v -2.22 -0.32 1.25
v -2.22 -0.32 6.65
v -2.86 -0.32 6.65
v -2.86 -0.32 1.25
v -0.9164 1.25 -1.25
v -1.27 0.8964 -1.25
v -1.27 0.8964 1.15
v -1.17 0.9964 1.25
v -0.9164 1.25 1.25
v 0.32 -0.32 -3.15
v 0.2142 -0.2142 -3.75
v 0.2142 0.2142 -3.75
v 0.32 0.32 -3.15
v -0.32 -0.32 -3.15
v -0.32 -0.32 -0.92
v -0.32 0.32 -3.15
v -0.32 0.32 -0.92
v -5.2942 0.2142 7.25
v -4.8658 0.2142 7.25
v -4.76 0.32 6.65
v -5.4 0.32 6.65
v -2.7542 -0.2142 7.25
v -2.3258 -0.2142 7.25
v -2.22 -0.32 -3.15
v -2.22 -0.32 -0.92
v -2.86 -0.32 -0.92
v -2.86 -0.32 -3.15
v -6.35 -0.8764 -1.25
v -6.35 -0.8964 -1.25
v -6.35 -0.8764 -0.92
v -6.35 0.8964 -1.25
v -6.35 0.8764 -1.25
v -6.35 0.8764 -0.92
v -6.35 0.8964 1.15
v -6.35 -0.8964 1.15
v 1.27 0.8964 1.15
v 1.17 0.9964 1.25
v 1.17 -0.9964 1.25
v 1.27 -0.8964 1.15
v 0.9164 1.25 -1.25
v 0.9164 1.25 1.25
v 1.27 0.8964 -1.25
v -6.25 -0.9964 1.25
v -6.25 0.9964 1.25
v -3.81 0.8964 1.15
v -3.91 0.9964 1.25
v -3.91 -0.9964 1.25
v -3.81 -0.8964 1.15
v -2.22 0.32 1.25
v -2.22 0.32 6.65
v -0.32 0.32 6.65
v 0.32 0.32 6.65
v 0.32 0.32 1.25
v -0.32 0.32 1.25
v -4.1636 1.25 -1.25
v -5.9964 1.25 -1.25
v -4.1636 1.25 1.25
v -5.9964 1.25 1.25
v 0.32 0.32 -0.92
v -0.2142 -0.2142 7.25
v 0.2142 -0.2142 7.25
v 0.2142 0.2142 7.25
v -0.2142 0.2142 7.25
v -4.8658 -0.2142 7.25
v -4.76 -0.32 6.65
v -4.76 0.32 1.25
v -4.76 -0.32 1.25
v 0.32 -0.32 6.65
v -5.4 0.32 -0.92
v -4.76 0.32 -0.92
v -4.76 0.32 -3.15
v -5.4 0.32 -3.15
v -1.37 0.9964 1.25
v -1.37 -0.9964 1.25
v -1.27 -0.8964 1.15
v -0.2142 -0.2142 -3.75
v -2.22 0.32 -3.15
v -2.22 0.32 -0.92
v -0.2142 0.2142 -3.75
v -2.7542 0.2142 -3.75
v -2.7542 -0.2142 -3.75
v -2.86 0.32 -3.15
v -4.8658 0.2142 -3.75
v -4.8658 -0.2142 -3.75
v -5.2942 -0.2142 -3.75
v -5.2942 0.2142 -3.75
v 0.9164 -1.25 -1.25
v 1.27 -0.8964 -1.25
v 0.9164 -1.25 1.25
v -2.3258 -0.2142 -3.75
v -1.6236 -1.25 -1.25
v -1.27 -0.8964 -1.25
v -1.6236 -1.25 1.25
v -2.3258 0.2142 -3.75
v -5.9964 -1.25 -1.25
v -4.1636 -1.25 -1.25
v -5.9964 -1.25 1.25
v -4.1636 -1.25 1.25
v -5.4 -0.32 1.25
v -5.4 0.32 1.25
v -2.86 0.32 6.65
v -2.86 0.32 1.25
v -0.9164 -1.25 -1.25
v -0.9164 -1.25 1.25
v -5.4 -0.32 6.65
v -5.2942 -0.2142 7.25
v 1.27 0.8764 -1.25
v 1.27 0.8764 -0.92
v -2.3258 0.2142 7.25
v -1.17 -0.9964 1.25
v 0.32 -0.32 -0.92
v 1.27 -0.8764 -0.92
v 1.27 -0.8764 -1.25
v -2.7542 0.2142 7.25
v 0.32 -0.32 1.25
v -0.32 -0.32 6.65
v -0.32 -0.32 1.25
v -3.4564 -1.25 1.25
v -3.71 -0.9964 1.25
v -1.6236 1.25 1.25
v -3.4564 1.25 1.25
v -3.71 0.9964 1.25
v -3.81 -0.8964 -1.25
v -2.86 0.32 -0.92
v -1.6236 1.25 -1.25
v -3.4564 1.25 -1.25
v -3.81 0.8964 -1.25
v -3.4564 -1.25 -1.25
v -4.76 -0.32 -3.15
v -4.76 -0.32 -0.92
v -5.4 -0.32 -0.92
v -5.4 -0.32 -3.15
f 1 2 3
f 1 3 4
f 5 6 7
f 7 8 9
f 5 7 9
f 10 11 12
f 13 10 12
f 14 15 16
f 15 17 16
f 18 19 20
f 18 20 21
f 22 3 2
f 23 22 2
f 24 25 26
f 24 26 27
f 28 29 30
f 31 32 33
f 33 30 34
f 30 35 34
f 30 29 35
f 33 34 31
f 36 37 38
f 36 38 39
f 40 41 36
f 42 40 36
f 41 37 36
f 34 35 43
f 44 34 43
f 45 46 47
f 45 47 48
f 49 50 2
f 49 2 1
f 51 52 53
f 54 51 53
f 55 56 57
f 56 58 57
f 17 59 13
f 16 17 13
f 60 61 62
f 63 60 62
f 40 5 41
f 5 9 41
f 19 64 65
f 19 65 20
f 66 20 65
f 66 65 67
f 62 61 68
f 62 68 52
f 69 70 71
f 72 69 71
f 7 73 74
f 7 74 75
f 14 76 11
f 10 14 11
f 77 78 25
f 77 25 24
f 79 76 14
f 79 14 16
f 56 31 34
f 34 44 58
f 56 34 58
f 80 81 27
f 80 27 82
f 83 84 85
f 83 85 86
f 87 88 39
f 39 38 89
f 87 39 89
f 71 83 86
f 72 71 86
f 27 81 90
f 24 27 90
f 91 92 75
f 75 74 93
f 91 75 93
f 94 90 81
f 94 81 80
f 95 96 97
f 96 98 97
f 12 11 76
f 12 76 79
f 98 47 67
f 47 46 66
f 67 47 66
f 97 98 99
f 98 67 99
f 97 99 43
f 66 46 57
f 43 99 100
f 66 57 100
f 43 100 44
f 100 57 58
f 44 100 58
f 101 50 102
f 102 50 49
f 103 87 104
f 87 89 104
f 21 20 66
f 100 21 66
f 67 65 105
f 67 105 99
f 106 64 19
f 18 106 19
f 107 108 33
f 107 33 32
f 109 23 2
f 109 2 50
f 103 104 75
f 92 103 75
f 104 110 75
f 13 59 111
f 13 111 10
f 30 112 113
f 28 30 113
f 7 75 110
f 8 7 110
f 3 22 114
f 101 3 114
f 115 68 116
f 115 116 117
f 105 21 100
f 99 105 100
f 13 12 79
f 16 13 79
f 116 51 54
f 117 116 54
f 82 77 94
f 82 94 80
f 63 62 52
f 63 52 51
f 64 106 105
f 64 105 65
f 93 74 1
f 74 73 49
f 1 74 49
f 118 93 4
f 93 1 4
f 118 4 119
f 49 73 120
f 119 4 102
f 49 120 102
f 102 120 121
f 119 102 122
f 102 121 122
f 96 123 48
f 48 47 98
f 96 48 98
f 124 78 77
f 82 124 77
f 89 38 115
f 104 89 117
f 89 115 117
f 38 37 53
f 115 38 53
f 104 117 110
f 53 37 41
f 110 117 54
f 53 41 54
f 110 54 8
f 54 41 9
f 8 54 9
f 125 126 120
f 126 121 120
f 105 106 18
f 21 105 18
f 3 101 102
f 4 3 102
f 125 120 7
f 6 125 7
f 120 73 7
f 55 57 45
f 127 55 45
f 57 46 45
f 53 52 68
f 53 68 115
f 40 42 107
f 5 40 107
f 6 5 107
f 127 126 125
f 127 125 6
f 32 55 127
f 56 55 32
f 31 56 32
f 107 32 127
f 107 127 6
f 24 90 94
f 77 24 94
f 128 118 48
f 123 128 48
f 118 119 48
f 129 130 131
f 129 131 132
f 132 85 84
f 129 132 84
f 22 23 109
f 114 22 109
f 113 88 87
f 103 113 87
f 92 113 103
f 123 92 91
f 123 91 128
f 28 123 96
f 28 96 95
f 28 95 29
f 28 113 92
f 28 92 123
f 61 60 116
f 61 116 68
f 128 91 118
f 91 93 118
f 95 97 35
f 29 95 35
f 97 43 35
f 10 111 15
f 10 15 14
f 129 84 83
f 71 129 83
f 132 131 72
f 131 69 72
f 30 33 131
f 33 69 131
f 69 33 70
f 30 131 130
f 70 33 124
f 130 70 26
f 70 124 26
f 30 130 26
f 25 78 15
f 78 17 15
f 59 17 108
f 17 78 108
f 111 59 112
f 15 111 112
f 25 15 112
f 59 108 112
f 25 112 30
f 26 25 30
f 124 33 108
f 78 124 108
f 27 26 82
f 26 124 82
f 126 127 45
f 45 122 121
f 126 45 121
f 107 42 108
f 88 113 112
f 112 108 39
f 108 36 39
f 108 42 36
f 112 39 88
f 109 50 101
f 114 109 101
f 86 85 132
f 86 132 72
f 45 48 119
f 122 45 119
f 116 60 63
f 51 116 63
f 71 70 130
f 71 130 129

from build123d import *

# Parameters (mm, degrees)
EXTRUDE1_DEPTH          = 1.25
CUT_EXTRUDE3_DEPTH      = 2.25
LPATTERN4_COUNT         = 3
LPATTERN4_PITCH         = 2.54
SKETCH2_W               = 1.752893218
SKETCH2_H               = 0.33
CUT_EXTRUDE1_DEPTH      = 2.27
CUT_EXTRUDE1_DEPTH_BACK = 7.35
SKETCH3_W               = 11
SKETCH3_H               = 0.64
EXTRUDE_THIN1_DEPTH     = 0.32
LPATTERN5_COUNT         = 3
LPATTERN5_PITCH         = 2.54
CHAMFER2_SIZE           = 0.6
CHAMFER2_SIZE2          = 0.105796188
CHAMFER2_PART_2_SIZE    = 0.6
CHAMFER2_PART_2_SIZE2   = 0.105796188
CHAMFER2_PART_3_SIZE    = 0.6
CHAMFER2_PART_3_SIZE2   = 0.105796188
CHAMFER2_PART_4_SIZE    = 0.6
CHAMFER2_PART_4_SIZE2   = 0.105796188
CHAMFER2_PART_5_SIZE    = 0.6
CHAMFER2_PART_5_SIZE2   = 0.105796188
CHAMFER2_PART_6_SIZE    = 0.6
CHAMFER2_PART_6_SIZE2   = 0.105796188
CHAMFER2_PART_7_SIZE    = 0.6
CHAMFER2_PART_7_SIZE2   = 0.105796188
CHAMFER2_PART_8_SIZE    = 0.6
CHAMFER2_PART_8_SIZE2   = 0.105796188
CHAMFER2_PART_9_SIZE    = 0.6
CHAMFER2_PART_9_SIZE2   = 0.105796188
CHAMFER2_PART_10_SIZE   = 0.6
CHAMFER2_PART_10_SIZE2  = 0.105796188
CHAMFER2_PART_11_SIZE   = 0.6
CHAMFER2_PART_11_SIZE2  = 0.105796188
CHAMFER2_PART_12_SIZE   = 0.6
CHAMFER2_PART_12_SIZE2  = 0.105796188
CHAMFER2_PART_13_SIZE   = 0.6
CHAMFER2_PART_13_SIZE2  = 0.105796188
CHAMFER2_PART_14_SIZE   = 0.6
CHAMFER2_PART_14_SIZE2  = 0.105796188
CHAMFER2_PART_15_SIZE   = 0.6
CHAMFER2_PART_15_SIZE2  = 0.105796188
CHAMFER2_PART_16_SIZE   = 0.6
CHAMFER2_PART_16_SIZE2  = 0.105796188
CHAMFER2_PART_17_SIZE   = 0.6
CHAMFER2_PART_17_SIZE2  = 0.105796188
CHAMFER2_PART_18_SIZE   = 0.6
CHAMFER2_PART_18_SIZE2  = 0.105796188
CHAMFER2_PART_19_SIZE   = 0.6
CHAMFER2_PART_19_SIZE2  = 0.105796188
CHAMFER2_PART_20_SIZE   = 0.6
CHAMFER2_PART_20_SIZE2  = 0.105796188
CHAMFER2_PART_21_SIZE   = 0.6
CHAMFER2_PART_21_SIZE2  = 0.105796188
CHAMFER2_PART_22_SIZE   = 0.6
CHAMFER2_PART_22_SIZE2  = 0.105796188
CHAMFER2_PART_23_SIZE   = 0.6
CHAMFER2_PART_23_SIZE2  = 0.105796188
CHAMFER2_PART_24_SIZE   = 0.6
CHAMFER2_PART_24_SIZE2  = 0.105796188


with BuildPart() as part:
    # Sketch1 → Extrude1 (new body, symmetric)
    with BuildSketch(Plane.XY):
        Polygon((-1.27, 0.896446609), (-0.916446609, 1.25), (0.916446609, 1.25), (1.27, 0.896446609), (1.27, -0.896446609), (0.916446609, -1.25), (-0.916446609, -1.25), (-1.27, -0.896446609), align=None)
    extrude1 = extrude(amount=EXTRUDE1_DEPTH, both=True)

    # Sketch4 → Cut-Extrude3 (cut, symmetric)
    with BuildSketch(Plane(origin=(0, 0, 0), x_dir=(1, 0, 0), z_dir=(0, 1, 0))):
        Polygon((-1.27, -1.15), (-1.17, -1.25), (-1.27, -1.25), align=None)
        Polygon((1.17, -1.25), (1.27, -1.15), (1.27, -1.25), align=None)
    cut_extrude3 = extrude(amount=CUT_EXTRUDE3_DEPTH, both=True, mode=Mode.SUBTRACT)

    # LPattern4: Extrude1, Cut-Extrude3 ×3
    with Locations(*[(-i * LPATTERN4_PITCH, 0, 0) for i in range(1, LPATTERN4_COUNT)]):
        add(extrude1)
        add(cut_extrude3, mode=Mode.SUBTRACT)

    # Sketch2 → Cut-Extrude1 (cut, two sides)
    with BuildSketch(Plane(origin=(0, 0, 0), x_dir=(0, -1, 0), z_dir=(1, 0, 0))) as cut_extrude1_sk:
        with Locations((0, 1.085)):
            Rectangle(SKETCH2_W, SKETCH2_H)
    extrude(amount=CUT_EXTRUDE1_DEPTH, mode=Mode.SUBTRACT)
    extrude(cut_extrude1_sk.sketch, amount=-CUT_EXTRUDE1_DEPTH_BACK, mode=Mode.SUBTRACT)

    # Sketch3 → Extrude-Thin1 (add, symmetric)
    with BuildSketch(Plane(origin=(0, 0, 0), x_dir=(0, 0, -1), z_dir=(1, 0, 0))):
        with Locations((-1.75, 0)):
            Rectangle(SKETCH3_W, SKETCH3_H)
    extrude_thin1 = extrude(amount=EXTRUDE_THIN1_DEPTH, both=True)

    # LPattern5: Extrude-Thin1 ×3
    with Locations(*[(-i * LPATTERN5_PITCH, 0, 0) for i in range(1, LPATTERN5_COUNT)]):
        add(extrude_thin1)

    # Chamfer2
    chamfer2_edges = [part.edges().sort_by_distance(p)[0] for p in [
        (0, -0.32, 7.25),
    ]]
    chamfer2_side = [part.faces().sort_by_distance(p)[0] for p in [
        (0, -0.32, 4.25),
    ]]
    chamfer(chamfer2_edges, length=CHAMFER2_SIZE, length2=CHAMFER2_SIZE2, reference=chamfer2_side[0])

    # Chamfer2 part 2
    chamfer2_part_2_edges = [part.edges().sort_by_distance(p)[0] for p in [
        (0, 0.32, -3.75),
    ]]
    chamfer2_part_2_side = [part.faces().sort_by_distance(p)[0] for p in [
        (0, 0.32, -2.335),
    ]]
    chamfer(chamfer2_part_2_edges, length=CHAMFER2_PART_2_SIZE, length2=CHAMFER2_PART_2_SIZE2, reference=chamfer2_part_2_side[0])

    # Chamfer2 part 3
    chamfer2_part_3_edges = [part.edges().sort_by_distance(p)[0] for p in [
        (-0.32, 0, 7.25),
    ]]
    chamfer2_part_3_side = [part.faces().sort_by_distance(p)[0] for p in [
        (-0.32, 0, 4.25),
    ]]
    chamfer(chamfer2_part_3_edges, length=CHAMFER2_PART_3_SIZE, length2=CHAMFER2_PART_3_SIZE2, reference=chamfer2_part_3_side[0])

    # Chamfer2 part 4
    chamfer2_part_4_edges = [part.edges().sort_by_distance(p)[0] for p in [
        (-0.32, 0, -3.75),
    ]]
    chamfer2_part_4_side = [part.faces().sort_by_distance(p)[0] for p in [
        (-0.32, 0, -2.335),
    ]]
    chamfer(chamfer2_part_4_edges, length=CHAMFER2_PART_4_SIZE, length2=CHAMFER2_PART_4_SIZE2, reference=chamfer2_part_4_side[0])

    # Chamfer2 part 5
    chamfer2_part_5_edges = [part.edges().sort_by_distance(p)[0] for p in [
        (0, -0.32, -3.75),
    ]]
    chamfer2_part_5_side = [part.faces().sort_by_distance(p)[0] for p in [
        (0, -0.32, -2.335),
    ]]
    chamfer(chamfer2_part_5_edges, length=CHAMFER2_PART_5_SIZE, length2=CHAMFER2_PART_5_SIZE2, reference=chamfer2_part_5_side[0])

    # Chamfer2 part 6
    chamfer2_part_6_edges = [part.edges().sort_by_distance(p)[0] for p in [
        (0.32, 0, -3.75),
    ]]
    chamfer2_part_6_side = [part.faces().sort_by_distance(p)[0] for p in [
        (0.32, 0, -2.335),
    ]]
    chamfer(chamfer2_part_6_edges, length=CHAMFER2_PART_6_SIZE, length2=CHAMFER2_PART_6_SIZE2, reference=chamfer2_part_6_side[0])

    # Chamfer2 part 7
    chamfer2_part_7_edges = [part.edges().sort_by_distance(p)[0] for p in [
        (0, 0.32, 7.25),
    ]]
    chamfer2_part_7_side = [part.faces().sort_by_distance(p)[0] for p in [
        (0, 0.32, 4.25),
    ]]
    chamfer(chamfer2_part_7_edges, length=CHAMFER2_PART_7_SIZE, length2=CHAMFER2_PART_7_SIZE2, reference=chamfer2_part_7_side[0])

    # Chamfer2 part 8
    chamfer2_part_8_edges = [part.edges().sort_by_distance(p)[0] for p in [
        (0.32, 0, 7.25),
    ]]
    chamfer2_part_8_side = [part.faces().sort_by_distance(p)[0] for p in [
        (0.32, 0, 4.25),
    ]]
    chamfer(chamfer2_part_8_edges, length=CHAMFER2_PART_8_SIZE, length2=CHAMFER2_PART_8_SIZE2, reference=chamfer2_part_8_side[0])

    # Chamfer2 part 9
    chamfer2_part_9_edges = [part.edges().sort_by_distance(p)[0] for p in [
        (-2.54, -0.32, 7.25),
    ]]
    chamfer2_part_9_side = [part.faces().sort_by_distance(p)[0] for p in [
        (-2.54, -0.32, 4.25),
    ]]
    chamfer(chamfer2_part_9_edges, length=CHAMFER2_PART_9_SIZE, length2=CHAMFER2_PART_9_SIZE2, reference=chamfer2_part_9_side[0])

    # Chamfer2 part 10
    chamfer2_part_10_edges = [part.edges().sort_by_distance(p)[0] for p in [
        (-2.54, 0.32, -3.75),
    ]]
    chamfer2_part_10_side = [part.faces().sort_by_distance(p)[0] for p in [
        (-2.54, 0.32, -2.335),
    ]]
    chamfer(chamfer2_part_10_edges, length=CHAMFER2_PART_10_SIZE, length2=CHAMFER2_PART_10_SIZE2, reference=chamfer2_part_10_side[0])

    # Chamfer2 part 11
    chamfer2_part_11_edges = [part.edges().sort_by_distance(p)[0] for p in [
        (-2.86, 0, -3.75),
    ]]
    chamfer2_part_11_side = [part.faces().sort_by_distance(p)[0] for p in [
        (-2.86, 0, -2.335),
    ]]
    chamfer(chamfer2_part_11_edges, length=CHAMFER2_PART_11_SIZE, length2=CHAMFER2_PART_11_SIZE2, reference=chamfer2_part_11_side[0])

    # Chamfer2 part 12
    chamfer2_part_12_edges = [part.edges().sort_by_distance(p)[0] for p in [
        (-2.86, 0, 7.25),
    ]]
    chamfer2_part_12_side = [part.faces().sort_by_distance(p)[0] for p in [
        (-2.86, 0, 4.25),
    ]]
    chamfer(chamfer2_part_12_edges, length=CHAMFER2_PART_12_SIZE, length2=CHAMFER2_PART_12_SIZE2, reference=chamfer2_part_12_side[0])

    # Chamfer2 part 13
    chamfer2_part_13_edges = [part.edges().sort_by_distance(p)[0] for p in [
        (-2.54, -0.32, -3.75),
    ]]
    chamfer2_part_13_side = [part.faces().sort_by_distance(p)[0] for p in [
        (-2.54, -0.32, -2.335),
    ]]
    chamfer(chamfer2_part_13_edges, length=CHAMFER2_PART_13_SIZE, length2=CHAMFER2_PART_13_SIZE2, reference=chamfer2_part_13_side[0])

    # Chamfer2 part 14
    chamfer2_part_14_edges = [part.edges().sort_by_distance(p)[0] for p in [
        (-2.22, 0, -3.75),
    ]]
    chamfer2_part_14_side = [part.faces().sort_by_distance(p)[0] for p in [
        (-2.22, 0, -2.335),
    ]]
    chamfer(chamfer2_part_14_edges, length=CHAMFER2_PART_14_SIZE, length2=CHAMFER2_PART_14_SIZE2, reference=chamfer2_part_14_side[0])

    # Chamfer2 part 15
    chamfer2_part_15_edges = [part.edges().sort_by_distance(p)[0] for p in [
        (-2.54, 0.32, 7.25),
    ]]
    chamfer2_part_15_side = [part.faces().sort_by_distance(p)[0] for p in [
        (-2.54, 0.32, 4.25),
    ]]
    chamfer(chamfer2_part_15_edges, length=CHAMFER2_PART_15_SIZE, length2=CHAMFER2_PART_15_SIZE2, reference=chamfer2_part_15_side[0])

    # Chamfer2 part 16
    chamfer2_part_16_edges = [part.edges().sort_by_distance(p)[0] for p in [
        (-2.22, 0, 7.25),
    ]]
    chamfer2_part_16_side = [part.faces().sort_by_distance(p)[0] for p in [
        (-2.22, 0, 4.25),
    ]]
    chamfer(chamfer2_part_16_edges, length=CHAMFER2_PART_16_SIZE, length2=CHAMFER2_PART_16_SIZE2, reference=chamfer2_part_16_side[0])

    # Chamfer2 part 17
    chamfer2_part_17_edges = [part.edges().sort_by_distance(p)[0] for p in [
        (-5.08, -0.32, 7.25),
    ]]
    chamfer2_part_17_side = [part.faces().sort_by_distance(p)[0] for p in [
        (-5.08, -0.32, 4.25),
    ]]
    chamfer(chamfer2_part_17_edges, length=CHAMFER2_PART_17_SIZE, length2=CHAMFER2_PART_17_SIZE2, reference=chamfer2_part_17_side[0])

    # Chamfer2 part 18
    chamfer2_part_18_edges = [part.edges().sort_by_distance(p)[0] for p in [
        (-5.08, 0.32, -3.75),
    ]]
    chamfer2_part_18_side = [part.faces().sort_by_distance(p)[0] for p in [
        (-5.08, 0.32, -2.335),
    ]]
    chamfer(chamfer2_part_18_edges, length=CHAMFER2_PART_18_SIZE, length2=CHAMFER2_PART_18_SIZE2, reference=chamfer2_part_18_side[0])

    # Chamfer2 part 19
    chamfer2_part_19_edges = [part.edges().sort_by_distance(p)[0] for p in [
        (-5.4, 0, -3.75),
    ]]
    chamfer2_part_19_side = [part.faces().sort_by_distance(p)[0] for p in [
        (-5.4, 0, -2.335),
    ]]
    chamfer(chamfer2_part_19_edges, length=CHAMFER2_PART_19_SIZE, length2=CHAMFER2_PART_19_SIZE2, reference=chamfer2_part_19_side[0])

    # Chamfer2 part 20
    chamfer2_part_20_edges = [part.edges().sort_by_distance(p)[0] for p in [
        (-5.4, 0, 7.25),
    ]]
    chamfer2_part_20_side = [part.faces().sort_by_distance(p)[0] for p in [
        (-5.4, 0, 4.25),
    ]]
    chamfer(chamfer2_part_20_edges, length=CHAMFER2_PART_20_SIZE, length2=CHAMFER2_PART_20_SIZE2, reference=chamfer2_part_20_side[0])

    # Chamfer2 part 21
    chamfer2_part_21_edges = [part.edges().sort_by_distance(p)[0] for p in [
        (-5.08, -0.32, -3.75),
    ]]
    chamfer2_part_21_side = [part.faces().sort_by_distance(p)[0] for p in [
        (-5.08, -0.32, -2.335),
    ]]
    chamfer(chamfer2_part_21_edges, length=CHAMFER2_PART_21_SIZE, length2=CHAMFER2_PART_21_SIZE2, reference=chamfer2_part_21_side[0])

    # Chamfer2 part 22
    chamfer2_part_22_edges = [part.edges().sort_by_distance(p)[0] for p in [
        (-4.76, 0, -3.75),
    ]]
    chamfer2_part_22_side = [part.faces().sort_by_distance(p)[0] for p in [
        (-4.76, 0, -2.335),
    ]]
    chamfer(chamfer2_part_22_edges, length=CHAMFER2_PART_22_SIZE, length2=CHAMFER2_PART_22_SIZE2, reference=chamfer2_part_22_side[0])

    # Chamfer2 part 23
    chamfer2_part_23_edges = [part.edges().sort_by_distance(p)[0] for p in [
        (-5.08, 0.32, 7.25),
    ]]
    chamfer2_part_23_side = [part.faces().sort_by_distance(p)[0] for p in [
        (-5.08, 0.32, 4.25),
    ]]
    chamfer(chamfer2_part_23_edges, length=CHAMFER2_PART_23_SIZE, length2=CHAMFER2_PART_23_SIZE2, reference=chamfer2_part_23_side[0])

    # Chamfer2 part 24
    chamfer2_part_24_edges = [part.edges().sort_by_distance(p)[0] for p in [
        (-4.76, 0, 7.25),
    ]]
    chamfer2_part_24_side = [part.faces().sort_by_distance(p)[0] for p in [
        (-4.76, 0, 4.25),
    ]]
    chamfer(chamfer2_part_24_edges, length=CHAMFER2_PART_24_SIZE, length2=CHAMFER2_PART_24_SIZE2, reference=chamfer2_part_24_side[0])


solid = part.part
